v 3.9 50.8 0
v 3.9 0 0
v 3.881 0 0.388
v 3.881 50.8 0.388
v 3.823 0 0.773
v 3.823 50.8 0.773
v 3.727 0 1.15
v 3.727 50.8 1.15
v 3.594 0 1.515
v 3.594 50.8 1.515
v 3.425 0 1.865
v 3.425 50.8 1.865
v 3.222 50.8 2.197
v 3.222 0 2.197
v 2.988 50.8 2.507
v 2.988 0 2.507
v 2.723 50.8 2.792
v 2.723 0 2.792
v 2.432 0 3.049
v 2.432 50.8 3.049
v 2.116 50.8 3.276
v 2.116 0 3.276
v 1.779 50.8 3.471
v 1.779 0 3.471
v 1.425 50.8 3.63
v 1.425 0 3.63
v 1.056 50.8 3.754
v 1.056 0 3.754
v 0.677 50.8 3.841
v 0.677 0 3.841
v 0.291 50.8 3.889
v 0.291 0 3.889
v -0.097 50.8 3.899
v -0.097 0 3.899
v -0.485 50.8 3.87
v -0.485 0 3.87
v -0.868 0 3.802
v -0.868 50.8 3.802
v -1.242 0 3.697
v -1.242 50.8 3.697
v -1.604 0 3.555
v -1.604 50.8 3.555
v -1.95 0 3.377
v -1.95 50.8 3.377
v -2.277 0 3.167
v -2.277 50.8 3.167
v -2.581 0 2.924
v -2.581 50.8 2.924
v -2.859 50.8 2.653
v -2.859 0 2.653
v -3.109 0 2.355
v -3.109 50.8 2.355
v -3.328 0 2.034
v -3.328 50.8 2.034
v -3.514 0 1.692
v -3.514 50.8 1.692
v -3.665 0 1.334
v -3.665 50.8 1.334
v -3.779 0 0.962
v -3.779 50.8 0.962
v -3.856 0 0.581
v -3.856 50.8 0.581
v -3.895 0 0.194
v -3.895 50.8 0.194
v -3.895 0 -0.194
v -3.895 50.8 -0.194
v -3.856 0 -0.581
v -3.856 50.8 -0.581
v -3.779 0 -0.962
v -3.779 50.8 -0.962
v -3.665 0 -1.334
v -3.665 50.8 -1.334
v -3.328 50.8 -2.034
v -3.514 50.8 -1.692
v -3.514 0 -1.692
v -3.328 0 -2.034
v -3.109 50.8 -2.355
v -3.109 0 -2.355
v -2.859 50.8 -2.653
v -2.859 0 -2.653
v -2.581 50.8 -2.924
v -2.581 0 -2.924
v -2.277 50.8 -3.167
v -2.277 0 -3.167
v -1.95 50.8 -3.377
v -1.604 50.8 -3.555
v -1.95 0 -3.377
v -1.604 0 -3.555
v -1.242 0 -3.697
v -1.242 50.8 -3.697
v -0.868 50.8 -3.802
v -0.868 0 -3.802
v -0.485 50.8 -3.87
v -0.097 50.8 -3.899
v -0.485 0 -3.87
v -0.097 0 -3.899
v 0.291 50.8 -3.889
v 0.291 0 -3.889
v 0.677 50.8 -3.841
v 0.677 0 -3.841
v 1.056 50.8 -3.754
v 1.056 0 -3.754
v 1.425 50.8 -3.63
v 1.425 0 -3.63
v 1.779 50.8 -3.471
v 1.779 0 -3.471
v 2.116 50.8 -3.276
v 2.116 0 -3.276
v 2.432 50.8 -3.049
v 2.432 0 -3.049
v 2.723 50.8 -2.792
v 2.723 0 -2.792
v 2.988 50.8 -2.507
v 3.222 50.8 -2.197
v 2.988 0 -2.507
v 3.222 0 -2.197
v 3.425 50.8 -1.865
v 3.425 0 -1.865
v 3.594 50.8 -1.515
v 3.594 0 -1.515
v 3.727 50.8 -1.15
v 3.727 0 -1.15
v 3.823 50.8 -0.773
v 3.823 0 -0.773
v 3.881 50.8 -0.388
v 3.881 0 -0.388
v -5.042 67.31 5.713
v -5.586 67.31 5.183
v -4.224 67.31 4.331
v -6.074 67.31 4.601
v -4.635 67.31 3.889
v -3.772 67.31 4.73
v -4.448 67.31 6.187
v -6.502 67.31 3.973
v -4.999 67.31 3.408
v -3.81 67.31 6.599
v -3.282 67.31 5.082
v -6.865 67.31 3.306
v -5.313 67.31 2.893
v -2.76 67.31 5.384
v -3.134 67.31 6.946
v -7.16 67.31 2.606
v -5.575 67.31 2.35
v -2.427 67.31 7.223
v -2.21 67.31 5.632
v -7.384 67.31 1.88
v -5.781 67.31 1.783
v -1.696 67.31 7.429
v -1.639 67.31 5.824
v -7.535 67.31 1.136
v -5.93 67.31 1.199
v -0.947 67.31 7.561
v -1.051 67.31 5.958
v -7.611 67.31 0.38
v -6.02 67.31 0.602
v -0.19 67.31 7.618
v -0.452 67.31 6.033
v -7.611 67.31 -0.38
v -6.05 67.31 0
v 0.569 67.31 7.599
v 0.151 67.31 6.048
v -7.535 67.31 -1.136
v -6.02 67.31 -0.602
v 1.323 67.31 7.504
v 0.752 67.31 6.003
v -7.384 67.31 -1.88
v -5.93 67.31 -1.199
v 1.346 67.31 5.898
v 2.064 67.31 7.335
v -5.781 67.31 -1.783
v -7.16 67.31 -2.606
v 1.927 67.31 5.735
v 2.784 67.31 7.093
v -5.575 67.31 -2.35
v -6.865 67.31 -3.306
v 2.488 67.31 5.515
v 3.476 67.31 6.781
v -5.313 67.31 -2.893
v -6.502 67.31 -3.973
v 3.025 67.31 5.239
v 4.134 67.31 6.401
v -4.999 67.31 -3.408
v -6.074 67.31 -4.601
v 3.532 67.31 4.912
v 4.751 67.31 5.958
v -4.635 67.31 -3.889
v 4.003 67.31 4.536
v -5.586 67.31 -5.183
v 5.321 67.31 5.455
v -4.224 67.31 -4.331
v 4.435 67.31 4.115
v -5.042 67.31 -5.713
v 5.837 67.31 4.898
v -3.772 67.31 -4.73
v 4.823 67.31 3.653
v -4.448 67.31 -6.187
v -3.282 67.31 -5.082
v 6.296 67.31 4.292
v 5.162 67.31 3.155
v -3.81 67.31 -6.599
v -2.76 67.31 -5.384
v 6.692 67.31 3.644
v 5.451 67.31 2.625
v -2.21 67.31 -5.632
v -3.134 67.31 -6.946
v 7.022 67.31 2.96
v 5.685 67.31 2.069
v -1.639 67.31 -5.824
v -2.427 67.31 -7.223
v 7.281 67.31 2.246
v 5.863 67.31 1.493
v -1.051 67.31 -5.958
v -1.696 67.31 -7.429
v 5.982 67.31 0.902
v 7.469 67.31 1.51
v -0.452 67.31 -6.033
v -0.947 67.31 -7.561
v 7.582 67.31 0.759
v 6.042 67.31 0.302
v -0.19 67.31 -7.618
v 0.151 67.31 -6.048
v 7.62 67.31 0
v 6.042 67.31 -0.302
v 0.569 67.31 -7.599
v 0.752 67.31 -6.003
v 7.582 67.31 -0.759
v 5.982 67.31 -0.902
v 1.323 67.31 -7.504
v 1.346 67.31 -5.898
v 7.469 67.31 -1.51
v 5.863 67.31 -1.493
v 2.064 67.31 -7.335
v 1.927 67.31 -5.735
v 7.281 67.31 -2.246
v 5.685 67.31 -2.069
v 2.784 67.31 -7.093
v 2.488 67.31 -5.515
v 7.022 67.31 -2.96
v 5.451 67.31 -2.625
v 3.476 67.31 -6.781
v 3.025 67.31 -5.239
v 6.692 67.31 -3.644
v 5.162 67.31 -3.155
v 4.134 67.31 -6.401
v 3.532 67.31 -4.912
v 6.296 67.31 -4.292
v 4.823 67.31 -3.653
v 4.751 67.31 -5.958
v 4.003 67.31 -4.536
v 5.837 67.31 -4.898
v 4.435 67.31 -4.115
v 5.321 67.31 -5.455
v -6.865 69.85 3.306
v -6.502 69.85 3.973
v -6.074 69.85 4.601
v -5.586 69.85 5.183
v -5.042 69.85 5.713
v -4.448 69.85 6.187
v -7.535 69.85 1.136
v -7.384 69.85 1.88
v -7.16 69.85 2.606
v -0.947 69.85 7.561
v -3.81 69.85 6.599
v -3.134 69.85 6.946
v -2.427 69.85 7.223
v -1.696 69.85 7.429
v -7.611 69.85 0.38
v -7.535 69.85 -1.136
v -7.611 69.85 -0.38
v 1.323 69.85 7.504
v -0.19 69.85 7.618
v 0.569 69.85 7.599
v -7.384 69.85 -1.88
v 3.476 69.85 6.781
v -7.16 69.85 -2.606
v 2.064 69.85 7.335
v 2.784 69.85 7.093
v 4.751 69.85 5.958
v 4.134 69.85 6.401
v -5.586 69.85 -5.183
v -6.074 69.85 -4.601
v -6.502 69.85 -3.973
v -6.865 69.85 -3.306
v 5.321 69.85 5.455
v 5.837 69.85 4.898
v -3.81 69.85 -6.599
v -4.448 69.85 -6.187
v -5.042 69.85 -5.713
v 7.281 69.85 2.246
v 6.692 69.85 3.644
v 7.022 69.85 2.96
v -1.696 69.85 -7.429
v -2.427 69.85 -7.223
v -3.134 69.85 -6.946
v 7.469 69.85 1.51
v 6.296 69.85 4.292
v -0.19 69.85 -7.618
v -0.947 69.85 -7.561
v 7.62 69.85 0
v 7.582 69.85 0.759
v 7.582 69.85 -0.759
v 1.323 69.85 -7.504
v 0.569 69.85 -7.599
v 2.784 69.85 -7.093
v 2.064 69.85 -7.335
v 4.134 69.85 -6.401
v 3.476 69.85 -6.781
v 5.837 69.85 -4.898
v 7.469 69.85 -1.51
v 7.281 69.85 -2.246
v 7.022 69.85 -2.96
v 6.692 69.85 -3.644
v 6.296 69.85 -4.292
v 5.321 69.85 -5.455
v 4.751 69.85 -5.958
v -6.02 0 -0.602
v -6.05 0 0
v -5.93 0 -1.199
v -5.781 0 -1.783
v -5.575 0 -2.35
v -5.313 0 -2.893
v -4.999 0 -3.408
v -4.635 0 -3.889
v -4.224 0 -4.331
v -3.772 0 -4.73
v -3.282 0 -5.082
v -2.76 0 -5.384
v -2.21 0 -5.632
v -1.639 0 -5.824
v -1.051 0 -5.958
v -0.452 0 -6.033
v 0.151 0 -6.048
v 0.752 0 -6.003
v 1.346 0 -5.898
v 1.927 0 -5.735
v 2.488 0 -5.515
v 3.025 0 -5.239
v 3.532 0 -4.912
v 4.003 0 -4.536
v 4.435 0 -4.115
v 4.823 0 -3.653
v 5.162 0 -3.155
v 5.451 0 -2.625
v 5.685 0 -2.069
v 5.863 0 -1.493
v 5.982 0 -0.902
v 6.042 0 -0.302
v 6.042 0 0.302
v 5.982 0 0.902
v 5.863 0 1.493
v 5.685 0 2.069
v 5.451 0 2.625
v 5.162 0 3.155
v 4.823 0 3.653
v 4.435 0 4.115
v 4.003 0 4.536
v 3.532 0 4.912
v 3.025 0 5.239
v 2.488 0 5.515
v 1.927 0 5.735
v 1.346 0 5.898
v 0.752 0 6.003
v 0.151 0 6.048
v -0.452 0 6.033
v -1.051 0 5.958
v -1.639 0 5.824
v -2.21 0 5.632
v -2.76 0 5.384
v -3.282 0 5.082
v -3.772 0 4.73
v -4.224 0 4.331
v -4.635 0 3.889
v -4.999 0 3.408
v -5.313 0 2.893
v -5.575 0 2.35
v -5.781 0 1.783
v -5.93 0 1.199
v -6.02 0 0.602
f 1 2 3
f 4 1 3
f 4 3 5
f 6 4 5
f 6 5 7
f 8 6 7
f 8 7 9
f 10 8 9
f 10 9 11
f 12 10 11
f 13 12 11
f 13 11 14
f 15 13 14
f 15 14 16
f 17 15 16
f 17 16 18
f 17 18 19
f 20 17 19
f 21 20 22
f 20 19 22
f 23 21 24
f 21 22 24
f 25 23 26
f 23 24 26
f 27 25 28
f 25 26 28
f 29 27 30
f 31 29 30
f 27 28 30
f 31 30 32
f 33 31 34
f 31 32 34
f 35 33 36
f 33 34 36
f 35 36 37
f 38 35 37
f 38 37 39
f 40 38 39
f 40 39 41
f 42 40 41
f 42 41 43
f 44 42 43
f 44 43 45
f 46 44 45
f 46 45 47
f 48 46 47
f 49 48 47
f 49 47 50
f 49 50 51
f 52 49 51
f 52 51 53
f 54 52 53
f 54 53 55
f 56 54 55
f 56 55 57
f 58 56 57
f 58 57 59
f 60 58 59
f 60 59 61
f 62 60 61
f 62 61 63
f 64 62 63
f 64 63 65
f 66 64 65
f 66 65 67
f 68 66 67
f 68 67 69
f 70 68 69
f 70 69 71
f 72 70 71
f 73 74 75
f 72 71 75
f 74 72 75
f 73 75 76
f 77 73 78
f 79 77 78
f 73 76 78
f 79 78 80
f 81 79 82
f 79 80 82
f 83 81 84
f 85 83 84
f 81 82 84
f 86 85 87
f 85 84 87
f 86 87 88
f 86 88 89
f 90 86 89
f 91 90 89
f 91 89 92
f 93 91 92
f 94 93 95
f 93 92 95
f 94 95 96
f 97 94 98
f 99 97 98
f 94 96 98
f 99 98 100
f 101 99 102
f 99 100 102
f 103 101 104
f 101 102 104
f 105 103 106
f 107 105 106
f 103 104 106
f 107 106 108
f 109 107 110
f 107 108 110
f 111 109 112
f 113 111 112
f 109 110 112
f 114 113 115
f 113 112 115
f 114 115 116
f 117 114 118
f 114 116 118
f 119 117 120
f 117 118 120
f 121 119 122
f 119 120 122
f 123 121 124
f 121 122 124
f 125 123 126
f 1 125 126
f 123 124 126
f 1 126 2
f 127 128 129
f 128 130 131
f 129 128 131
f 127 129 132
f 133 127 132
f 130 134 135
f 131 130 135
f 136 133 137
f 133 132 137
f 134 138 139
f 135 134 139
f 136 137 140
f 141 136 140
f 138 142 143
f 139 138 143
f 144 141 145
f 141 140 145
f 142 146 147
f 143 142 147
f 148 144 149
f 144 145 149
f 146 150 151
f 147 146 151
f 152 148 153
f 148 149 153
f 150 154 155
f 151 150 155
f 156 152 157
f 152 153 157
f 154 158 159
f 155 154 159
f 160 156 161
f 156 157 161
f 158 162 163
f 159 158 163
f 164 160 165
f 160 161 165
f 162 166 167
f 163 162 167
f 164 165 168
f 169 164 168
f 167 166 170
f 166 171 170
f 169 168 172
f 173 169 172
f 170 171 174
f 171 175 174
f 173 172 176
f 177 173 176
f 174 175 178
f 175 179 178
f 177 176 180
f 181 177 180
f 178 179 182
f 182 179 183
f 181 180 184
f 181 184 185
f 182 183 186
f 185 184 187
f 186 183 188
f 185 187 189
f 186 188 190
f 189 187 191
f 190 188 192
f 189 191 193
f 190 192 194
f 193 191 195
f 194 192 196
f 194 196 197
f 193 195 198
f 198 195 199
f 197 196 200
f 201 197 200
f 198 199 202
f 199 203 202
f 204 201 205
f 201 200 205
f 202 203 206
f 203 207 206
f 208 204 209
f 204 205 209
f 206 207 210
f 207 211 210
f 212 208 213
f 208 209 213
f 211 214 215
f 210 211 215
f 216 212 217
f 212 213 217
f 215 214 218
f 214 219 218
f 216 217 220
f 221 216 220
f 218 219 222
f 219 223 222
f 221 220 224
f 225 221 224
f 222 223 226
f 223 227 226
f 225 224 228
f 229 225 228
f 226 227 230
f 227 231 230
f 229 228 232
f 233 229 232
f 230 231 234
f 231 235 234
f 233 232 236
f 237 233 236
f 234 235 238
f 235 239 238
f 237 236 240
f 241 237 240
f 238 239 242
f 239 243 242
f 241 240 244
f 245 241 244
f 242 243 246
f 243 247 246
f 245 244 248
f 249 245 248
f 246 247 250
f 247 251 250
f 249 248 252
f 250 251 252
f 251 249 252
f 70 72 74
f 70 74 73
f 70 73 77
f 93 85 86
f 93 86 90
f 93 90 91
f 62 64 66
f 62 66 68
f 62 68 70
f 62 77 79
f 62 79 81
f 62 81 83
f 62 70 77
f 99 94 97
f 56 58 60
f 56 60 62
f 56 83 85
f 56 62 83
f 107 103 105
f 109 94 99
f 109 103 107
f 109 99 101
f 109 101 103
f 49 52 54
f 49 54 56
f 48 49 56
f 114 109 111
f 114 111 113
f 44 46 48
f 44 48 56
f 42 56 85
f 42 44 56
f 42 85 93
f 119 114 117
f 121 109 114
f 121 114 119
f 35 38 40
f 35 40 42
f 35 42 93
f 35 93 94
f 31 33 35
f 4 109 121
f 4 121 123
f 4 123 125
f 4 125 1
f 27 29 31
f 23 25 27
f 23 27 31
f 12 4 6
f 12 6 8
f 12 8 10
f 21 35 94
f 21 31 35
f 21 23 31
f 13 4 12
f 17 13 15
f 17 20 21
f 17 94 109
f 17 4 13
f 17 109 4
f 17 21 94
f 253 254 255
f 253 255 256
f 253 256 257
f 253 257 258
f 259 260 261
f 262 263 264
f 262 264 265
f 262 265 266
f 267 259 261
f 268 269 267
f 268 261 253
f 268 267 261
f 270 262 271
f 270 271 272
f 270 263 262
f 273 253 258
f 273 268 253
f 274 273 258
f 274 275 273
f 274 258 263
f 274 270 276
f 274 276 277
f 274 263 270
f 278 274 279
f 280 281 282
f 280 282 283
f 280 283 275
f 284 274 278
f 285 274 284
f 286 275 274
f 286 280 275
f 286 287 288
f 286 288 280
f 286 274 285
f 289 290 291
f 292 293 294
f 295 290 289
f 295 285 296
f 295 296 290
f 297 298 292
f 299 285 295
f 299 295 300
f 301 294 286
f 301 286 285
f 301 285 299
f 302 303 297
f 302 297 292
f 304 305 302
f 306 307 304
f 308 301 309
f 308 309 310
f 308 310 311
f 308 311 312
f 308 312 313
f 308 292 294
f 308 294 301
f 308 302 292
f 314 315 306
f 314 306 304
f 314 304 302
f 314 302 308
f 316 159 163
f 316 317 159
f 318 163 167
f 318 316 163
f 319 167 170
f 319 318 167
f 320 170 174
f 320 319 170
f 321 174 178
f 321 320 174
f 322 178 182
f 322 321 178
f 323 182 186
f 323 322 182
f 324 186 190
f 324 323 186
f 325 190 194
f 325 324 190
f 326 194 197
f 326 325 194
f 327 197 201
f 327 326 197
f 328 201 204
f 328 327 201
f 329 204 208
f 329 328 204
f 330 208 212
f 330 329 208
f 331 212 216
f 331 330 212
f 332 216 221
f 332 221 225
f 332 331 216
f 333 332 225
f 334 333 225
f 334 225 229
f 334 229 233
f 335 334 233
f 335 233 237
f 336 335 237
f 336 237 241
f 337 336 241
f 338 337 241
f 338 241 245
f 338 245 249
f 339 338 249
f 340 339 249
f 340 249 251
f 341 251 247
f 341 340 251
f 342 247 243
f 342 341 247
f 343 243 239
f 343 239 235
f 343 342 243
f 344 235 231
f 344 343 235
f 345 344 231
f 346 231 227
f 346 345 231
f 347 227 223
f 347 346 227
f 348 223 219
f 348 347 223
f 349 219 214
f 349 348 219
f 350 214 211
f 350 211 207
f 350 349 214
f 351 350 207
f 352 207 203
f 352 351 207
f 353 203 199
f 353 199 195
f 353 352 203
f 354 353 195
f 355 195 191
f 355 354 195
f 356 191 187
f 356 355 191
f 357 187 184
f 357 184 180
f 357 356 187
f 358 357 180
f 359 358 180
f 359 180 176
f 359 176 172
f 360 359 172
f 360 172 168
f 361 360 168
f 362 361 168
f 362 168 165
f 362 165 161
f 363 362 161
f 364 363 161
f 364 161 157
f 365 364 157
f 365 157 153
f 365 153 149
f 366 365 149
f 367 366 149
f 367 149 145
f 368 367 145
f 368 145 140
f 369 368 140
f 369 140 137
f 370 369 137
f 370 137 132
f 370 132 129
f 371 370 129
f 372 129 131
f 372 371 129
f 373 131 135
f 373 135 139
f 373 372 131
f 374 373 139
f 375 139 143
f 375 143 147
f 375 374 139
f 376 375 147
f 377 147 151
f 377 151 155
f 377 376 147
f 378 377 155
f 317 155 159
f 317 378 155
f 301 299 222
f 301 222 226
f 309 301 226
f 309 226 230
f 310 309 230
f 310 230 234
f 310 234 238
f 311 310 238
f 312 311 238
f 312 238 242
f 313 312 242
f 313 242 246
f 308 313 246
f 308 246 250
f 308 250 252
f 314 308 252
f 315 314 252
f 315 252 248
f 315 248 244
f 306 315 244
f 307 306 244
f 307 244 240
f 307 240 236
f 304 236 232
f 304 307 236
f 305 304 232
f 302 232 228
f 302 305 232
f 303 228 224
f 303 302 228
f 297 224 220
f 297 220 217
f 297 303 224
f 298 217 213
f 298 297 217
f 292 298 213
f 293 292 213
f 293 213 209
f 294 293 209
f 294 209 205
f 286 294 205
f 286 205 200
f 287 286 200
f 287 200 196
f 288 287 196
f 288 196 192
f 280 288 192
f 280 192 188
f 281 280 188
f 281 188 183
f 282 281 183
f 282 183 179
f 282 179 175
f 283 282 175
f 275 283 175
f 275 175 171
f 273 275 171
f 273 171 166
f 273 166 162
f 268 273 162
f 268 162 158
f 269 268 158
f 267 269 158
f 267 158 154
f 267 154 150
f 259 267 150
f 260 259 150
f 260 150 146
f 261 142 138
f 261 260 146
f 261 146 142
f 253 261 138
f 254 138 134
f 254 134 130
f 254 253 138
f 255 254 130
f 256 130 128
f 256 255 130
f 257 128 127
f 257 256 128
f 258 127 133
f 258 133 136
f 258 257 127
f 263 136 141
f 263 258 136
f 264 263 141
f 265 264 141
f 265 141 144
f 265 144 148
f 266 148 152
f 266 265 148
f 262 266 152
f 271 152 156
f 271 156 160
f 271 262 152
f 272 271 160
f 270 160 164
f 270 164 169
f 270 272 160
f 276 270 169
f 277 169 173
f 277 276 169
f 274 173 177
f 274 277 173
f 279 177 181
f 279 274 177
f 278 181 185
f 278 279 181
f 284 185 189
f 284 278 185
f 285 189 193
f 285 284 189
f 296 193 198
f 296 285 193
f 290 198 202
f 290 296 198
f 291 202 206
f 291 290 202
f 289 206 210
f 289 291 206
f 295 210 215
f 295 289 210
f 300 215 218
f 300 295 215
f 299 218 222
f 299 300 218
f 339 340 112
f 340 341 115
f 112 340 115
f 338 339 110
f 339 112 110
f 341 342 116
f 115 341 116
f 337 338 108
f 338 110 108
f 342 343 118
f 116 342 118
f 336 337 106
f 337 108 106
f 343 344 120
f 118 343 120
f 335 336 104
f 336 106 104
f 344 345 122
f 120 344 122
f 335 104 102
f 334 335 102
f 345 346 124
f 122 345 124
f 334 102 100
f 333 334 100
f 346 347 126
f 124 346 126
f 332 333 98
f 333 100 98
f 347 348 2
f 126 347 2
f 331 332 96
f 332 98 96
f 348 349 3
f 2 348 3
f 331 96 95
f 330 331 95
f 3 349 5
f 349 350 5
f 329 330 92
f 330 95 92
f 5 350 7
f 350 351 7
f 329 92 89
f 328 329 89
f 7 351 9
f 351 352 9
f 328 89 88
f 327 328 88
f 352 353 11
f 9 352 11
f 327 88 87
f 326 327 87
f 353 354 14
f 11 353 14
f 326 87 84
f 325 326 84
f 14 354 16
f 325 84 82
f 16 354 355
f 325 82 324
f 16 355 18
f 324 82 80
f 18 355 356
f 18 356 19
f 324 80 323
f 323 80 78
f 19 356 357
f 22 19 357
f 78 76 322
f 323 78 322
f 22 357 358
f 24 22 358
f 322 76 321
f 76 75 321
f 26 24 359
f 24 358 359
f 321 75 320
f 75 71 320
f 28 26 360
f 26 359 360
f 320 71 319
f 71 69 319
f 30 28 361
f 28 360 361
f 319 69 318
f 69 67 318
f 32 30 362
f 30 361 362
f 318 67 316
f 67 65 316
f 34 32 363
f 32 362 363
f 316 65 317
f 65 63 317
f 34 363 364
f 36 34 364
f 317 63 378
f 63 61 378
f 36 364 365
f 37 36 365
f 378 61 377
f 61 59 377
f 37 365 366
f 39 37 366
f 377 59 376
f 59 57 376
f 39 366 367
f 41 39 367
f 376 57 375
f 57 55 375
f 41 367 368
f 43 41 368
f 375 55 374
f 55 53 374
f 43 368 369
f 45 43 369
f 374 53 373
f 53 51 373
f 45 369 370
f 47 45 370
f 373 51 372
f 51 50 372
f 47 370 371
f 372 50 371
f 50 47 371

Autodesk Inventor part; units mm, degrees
ref_plane "YZ Plane" through (0, 0, 0) normal (1, 0, 0) x (0, 1, 0)
ref_plane "XZ Plane" through (0, 0, 0) normal (0, 1, 0) x (-1, 0, 0)
ref_plane "XY Plane" through (0, 0, 0) normal (0, 0, 1) x (1, 0, 0)
sketch "Sketch1" plane through (0, 0, 0) normal (0, 1, 0) x (-1, 0, 0)
  circle A0 centre (0, 0) radius 6.05
  dimension "d0" = 12.1
extrude "Extrusion1" add sketch "Sketch1" along normal blind 69.85
sketch "Sketch2" plane through (0, 69.85, 0) normal (0, 1, 0) x (1, 0, 0)
  circle A0 centre (0, 0) radius 6.7945
  circle A1 centre (0, 0) radius 7.62
  dimension "d3" = 15.24
extrude "Extrusion2" add sketch "Sketch2" against normal blind 2.54 contours A0 | A1
sketch "Sketch3" plane through (0, 0, 0) normal (0, -1, 0) x (1, 0, 0)
  circle A0 centre (0, 0) radius 3.9
  dimension "d6" = 7.8
extrude "Extrusion3" cut sketch "Sketch3" against normal blind 50.8
properties part number "Press_Head"
